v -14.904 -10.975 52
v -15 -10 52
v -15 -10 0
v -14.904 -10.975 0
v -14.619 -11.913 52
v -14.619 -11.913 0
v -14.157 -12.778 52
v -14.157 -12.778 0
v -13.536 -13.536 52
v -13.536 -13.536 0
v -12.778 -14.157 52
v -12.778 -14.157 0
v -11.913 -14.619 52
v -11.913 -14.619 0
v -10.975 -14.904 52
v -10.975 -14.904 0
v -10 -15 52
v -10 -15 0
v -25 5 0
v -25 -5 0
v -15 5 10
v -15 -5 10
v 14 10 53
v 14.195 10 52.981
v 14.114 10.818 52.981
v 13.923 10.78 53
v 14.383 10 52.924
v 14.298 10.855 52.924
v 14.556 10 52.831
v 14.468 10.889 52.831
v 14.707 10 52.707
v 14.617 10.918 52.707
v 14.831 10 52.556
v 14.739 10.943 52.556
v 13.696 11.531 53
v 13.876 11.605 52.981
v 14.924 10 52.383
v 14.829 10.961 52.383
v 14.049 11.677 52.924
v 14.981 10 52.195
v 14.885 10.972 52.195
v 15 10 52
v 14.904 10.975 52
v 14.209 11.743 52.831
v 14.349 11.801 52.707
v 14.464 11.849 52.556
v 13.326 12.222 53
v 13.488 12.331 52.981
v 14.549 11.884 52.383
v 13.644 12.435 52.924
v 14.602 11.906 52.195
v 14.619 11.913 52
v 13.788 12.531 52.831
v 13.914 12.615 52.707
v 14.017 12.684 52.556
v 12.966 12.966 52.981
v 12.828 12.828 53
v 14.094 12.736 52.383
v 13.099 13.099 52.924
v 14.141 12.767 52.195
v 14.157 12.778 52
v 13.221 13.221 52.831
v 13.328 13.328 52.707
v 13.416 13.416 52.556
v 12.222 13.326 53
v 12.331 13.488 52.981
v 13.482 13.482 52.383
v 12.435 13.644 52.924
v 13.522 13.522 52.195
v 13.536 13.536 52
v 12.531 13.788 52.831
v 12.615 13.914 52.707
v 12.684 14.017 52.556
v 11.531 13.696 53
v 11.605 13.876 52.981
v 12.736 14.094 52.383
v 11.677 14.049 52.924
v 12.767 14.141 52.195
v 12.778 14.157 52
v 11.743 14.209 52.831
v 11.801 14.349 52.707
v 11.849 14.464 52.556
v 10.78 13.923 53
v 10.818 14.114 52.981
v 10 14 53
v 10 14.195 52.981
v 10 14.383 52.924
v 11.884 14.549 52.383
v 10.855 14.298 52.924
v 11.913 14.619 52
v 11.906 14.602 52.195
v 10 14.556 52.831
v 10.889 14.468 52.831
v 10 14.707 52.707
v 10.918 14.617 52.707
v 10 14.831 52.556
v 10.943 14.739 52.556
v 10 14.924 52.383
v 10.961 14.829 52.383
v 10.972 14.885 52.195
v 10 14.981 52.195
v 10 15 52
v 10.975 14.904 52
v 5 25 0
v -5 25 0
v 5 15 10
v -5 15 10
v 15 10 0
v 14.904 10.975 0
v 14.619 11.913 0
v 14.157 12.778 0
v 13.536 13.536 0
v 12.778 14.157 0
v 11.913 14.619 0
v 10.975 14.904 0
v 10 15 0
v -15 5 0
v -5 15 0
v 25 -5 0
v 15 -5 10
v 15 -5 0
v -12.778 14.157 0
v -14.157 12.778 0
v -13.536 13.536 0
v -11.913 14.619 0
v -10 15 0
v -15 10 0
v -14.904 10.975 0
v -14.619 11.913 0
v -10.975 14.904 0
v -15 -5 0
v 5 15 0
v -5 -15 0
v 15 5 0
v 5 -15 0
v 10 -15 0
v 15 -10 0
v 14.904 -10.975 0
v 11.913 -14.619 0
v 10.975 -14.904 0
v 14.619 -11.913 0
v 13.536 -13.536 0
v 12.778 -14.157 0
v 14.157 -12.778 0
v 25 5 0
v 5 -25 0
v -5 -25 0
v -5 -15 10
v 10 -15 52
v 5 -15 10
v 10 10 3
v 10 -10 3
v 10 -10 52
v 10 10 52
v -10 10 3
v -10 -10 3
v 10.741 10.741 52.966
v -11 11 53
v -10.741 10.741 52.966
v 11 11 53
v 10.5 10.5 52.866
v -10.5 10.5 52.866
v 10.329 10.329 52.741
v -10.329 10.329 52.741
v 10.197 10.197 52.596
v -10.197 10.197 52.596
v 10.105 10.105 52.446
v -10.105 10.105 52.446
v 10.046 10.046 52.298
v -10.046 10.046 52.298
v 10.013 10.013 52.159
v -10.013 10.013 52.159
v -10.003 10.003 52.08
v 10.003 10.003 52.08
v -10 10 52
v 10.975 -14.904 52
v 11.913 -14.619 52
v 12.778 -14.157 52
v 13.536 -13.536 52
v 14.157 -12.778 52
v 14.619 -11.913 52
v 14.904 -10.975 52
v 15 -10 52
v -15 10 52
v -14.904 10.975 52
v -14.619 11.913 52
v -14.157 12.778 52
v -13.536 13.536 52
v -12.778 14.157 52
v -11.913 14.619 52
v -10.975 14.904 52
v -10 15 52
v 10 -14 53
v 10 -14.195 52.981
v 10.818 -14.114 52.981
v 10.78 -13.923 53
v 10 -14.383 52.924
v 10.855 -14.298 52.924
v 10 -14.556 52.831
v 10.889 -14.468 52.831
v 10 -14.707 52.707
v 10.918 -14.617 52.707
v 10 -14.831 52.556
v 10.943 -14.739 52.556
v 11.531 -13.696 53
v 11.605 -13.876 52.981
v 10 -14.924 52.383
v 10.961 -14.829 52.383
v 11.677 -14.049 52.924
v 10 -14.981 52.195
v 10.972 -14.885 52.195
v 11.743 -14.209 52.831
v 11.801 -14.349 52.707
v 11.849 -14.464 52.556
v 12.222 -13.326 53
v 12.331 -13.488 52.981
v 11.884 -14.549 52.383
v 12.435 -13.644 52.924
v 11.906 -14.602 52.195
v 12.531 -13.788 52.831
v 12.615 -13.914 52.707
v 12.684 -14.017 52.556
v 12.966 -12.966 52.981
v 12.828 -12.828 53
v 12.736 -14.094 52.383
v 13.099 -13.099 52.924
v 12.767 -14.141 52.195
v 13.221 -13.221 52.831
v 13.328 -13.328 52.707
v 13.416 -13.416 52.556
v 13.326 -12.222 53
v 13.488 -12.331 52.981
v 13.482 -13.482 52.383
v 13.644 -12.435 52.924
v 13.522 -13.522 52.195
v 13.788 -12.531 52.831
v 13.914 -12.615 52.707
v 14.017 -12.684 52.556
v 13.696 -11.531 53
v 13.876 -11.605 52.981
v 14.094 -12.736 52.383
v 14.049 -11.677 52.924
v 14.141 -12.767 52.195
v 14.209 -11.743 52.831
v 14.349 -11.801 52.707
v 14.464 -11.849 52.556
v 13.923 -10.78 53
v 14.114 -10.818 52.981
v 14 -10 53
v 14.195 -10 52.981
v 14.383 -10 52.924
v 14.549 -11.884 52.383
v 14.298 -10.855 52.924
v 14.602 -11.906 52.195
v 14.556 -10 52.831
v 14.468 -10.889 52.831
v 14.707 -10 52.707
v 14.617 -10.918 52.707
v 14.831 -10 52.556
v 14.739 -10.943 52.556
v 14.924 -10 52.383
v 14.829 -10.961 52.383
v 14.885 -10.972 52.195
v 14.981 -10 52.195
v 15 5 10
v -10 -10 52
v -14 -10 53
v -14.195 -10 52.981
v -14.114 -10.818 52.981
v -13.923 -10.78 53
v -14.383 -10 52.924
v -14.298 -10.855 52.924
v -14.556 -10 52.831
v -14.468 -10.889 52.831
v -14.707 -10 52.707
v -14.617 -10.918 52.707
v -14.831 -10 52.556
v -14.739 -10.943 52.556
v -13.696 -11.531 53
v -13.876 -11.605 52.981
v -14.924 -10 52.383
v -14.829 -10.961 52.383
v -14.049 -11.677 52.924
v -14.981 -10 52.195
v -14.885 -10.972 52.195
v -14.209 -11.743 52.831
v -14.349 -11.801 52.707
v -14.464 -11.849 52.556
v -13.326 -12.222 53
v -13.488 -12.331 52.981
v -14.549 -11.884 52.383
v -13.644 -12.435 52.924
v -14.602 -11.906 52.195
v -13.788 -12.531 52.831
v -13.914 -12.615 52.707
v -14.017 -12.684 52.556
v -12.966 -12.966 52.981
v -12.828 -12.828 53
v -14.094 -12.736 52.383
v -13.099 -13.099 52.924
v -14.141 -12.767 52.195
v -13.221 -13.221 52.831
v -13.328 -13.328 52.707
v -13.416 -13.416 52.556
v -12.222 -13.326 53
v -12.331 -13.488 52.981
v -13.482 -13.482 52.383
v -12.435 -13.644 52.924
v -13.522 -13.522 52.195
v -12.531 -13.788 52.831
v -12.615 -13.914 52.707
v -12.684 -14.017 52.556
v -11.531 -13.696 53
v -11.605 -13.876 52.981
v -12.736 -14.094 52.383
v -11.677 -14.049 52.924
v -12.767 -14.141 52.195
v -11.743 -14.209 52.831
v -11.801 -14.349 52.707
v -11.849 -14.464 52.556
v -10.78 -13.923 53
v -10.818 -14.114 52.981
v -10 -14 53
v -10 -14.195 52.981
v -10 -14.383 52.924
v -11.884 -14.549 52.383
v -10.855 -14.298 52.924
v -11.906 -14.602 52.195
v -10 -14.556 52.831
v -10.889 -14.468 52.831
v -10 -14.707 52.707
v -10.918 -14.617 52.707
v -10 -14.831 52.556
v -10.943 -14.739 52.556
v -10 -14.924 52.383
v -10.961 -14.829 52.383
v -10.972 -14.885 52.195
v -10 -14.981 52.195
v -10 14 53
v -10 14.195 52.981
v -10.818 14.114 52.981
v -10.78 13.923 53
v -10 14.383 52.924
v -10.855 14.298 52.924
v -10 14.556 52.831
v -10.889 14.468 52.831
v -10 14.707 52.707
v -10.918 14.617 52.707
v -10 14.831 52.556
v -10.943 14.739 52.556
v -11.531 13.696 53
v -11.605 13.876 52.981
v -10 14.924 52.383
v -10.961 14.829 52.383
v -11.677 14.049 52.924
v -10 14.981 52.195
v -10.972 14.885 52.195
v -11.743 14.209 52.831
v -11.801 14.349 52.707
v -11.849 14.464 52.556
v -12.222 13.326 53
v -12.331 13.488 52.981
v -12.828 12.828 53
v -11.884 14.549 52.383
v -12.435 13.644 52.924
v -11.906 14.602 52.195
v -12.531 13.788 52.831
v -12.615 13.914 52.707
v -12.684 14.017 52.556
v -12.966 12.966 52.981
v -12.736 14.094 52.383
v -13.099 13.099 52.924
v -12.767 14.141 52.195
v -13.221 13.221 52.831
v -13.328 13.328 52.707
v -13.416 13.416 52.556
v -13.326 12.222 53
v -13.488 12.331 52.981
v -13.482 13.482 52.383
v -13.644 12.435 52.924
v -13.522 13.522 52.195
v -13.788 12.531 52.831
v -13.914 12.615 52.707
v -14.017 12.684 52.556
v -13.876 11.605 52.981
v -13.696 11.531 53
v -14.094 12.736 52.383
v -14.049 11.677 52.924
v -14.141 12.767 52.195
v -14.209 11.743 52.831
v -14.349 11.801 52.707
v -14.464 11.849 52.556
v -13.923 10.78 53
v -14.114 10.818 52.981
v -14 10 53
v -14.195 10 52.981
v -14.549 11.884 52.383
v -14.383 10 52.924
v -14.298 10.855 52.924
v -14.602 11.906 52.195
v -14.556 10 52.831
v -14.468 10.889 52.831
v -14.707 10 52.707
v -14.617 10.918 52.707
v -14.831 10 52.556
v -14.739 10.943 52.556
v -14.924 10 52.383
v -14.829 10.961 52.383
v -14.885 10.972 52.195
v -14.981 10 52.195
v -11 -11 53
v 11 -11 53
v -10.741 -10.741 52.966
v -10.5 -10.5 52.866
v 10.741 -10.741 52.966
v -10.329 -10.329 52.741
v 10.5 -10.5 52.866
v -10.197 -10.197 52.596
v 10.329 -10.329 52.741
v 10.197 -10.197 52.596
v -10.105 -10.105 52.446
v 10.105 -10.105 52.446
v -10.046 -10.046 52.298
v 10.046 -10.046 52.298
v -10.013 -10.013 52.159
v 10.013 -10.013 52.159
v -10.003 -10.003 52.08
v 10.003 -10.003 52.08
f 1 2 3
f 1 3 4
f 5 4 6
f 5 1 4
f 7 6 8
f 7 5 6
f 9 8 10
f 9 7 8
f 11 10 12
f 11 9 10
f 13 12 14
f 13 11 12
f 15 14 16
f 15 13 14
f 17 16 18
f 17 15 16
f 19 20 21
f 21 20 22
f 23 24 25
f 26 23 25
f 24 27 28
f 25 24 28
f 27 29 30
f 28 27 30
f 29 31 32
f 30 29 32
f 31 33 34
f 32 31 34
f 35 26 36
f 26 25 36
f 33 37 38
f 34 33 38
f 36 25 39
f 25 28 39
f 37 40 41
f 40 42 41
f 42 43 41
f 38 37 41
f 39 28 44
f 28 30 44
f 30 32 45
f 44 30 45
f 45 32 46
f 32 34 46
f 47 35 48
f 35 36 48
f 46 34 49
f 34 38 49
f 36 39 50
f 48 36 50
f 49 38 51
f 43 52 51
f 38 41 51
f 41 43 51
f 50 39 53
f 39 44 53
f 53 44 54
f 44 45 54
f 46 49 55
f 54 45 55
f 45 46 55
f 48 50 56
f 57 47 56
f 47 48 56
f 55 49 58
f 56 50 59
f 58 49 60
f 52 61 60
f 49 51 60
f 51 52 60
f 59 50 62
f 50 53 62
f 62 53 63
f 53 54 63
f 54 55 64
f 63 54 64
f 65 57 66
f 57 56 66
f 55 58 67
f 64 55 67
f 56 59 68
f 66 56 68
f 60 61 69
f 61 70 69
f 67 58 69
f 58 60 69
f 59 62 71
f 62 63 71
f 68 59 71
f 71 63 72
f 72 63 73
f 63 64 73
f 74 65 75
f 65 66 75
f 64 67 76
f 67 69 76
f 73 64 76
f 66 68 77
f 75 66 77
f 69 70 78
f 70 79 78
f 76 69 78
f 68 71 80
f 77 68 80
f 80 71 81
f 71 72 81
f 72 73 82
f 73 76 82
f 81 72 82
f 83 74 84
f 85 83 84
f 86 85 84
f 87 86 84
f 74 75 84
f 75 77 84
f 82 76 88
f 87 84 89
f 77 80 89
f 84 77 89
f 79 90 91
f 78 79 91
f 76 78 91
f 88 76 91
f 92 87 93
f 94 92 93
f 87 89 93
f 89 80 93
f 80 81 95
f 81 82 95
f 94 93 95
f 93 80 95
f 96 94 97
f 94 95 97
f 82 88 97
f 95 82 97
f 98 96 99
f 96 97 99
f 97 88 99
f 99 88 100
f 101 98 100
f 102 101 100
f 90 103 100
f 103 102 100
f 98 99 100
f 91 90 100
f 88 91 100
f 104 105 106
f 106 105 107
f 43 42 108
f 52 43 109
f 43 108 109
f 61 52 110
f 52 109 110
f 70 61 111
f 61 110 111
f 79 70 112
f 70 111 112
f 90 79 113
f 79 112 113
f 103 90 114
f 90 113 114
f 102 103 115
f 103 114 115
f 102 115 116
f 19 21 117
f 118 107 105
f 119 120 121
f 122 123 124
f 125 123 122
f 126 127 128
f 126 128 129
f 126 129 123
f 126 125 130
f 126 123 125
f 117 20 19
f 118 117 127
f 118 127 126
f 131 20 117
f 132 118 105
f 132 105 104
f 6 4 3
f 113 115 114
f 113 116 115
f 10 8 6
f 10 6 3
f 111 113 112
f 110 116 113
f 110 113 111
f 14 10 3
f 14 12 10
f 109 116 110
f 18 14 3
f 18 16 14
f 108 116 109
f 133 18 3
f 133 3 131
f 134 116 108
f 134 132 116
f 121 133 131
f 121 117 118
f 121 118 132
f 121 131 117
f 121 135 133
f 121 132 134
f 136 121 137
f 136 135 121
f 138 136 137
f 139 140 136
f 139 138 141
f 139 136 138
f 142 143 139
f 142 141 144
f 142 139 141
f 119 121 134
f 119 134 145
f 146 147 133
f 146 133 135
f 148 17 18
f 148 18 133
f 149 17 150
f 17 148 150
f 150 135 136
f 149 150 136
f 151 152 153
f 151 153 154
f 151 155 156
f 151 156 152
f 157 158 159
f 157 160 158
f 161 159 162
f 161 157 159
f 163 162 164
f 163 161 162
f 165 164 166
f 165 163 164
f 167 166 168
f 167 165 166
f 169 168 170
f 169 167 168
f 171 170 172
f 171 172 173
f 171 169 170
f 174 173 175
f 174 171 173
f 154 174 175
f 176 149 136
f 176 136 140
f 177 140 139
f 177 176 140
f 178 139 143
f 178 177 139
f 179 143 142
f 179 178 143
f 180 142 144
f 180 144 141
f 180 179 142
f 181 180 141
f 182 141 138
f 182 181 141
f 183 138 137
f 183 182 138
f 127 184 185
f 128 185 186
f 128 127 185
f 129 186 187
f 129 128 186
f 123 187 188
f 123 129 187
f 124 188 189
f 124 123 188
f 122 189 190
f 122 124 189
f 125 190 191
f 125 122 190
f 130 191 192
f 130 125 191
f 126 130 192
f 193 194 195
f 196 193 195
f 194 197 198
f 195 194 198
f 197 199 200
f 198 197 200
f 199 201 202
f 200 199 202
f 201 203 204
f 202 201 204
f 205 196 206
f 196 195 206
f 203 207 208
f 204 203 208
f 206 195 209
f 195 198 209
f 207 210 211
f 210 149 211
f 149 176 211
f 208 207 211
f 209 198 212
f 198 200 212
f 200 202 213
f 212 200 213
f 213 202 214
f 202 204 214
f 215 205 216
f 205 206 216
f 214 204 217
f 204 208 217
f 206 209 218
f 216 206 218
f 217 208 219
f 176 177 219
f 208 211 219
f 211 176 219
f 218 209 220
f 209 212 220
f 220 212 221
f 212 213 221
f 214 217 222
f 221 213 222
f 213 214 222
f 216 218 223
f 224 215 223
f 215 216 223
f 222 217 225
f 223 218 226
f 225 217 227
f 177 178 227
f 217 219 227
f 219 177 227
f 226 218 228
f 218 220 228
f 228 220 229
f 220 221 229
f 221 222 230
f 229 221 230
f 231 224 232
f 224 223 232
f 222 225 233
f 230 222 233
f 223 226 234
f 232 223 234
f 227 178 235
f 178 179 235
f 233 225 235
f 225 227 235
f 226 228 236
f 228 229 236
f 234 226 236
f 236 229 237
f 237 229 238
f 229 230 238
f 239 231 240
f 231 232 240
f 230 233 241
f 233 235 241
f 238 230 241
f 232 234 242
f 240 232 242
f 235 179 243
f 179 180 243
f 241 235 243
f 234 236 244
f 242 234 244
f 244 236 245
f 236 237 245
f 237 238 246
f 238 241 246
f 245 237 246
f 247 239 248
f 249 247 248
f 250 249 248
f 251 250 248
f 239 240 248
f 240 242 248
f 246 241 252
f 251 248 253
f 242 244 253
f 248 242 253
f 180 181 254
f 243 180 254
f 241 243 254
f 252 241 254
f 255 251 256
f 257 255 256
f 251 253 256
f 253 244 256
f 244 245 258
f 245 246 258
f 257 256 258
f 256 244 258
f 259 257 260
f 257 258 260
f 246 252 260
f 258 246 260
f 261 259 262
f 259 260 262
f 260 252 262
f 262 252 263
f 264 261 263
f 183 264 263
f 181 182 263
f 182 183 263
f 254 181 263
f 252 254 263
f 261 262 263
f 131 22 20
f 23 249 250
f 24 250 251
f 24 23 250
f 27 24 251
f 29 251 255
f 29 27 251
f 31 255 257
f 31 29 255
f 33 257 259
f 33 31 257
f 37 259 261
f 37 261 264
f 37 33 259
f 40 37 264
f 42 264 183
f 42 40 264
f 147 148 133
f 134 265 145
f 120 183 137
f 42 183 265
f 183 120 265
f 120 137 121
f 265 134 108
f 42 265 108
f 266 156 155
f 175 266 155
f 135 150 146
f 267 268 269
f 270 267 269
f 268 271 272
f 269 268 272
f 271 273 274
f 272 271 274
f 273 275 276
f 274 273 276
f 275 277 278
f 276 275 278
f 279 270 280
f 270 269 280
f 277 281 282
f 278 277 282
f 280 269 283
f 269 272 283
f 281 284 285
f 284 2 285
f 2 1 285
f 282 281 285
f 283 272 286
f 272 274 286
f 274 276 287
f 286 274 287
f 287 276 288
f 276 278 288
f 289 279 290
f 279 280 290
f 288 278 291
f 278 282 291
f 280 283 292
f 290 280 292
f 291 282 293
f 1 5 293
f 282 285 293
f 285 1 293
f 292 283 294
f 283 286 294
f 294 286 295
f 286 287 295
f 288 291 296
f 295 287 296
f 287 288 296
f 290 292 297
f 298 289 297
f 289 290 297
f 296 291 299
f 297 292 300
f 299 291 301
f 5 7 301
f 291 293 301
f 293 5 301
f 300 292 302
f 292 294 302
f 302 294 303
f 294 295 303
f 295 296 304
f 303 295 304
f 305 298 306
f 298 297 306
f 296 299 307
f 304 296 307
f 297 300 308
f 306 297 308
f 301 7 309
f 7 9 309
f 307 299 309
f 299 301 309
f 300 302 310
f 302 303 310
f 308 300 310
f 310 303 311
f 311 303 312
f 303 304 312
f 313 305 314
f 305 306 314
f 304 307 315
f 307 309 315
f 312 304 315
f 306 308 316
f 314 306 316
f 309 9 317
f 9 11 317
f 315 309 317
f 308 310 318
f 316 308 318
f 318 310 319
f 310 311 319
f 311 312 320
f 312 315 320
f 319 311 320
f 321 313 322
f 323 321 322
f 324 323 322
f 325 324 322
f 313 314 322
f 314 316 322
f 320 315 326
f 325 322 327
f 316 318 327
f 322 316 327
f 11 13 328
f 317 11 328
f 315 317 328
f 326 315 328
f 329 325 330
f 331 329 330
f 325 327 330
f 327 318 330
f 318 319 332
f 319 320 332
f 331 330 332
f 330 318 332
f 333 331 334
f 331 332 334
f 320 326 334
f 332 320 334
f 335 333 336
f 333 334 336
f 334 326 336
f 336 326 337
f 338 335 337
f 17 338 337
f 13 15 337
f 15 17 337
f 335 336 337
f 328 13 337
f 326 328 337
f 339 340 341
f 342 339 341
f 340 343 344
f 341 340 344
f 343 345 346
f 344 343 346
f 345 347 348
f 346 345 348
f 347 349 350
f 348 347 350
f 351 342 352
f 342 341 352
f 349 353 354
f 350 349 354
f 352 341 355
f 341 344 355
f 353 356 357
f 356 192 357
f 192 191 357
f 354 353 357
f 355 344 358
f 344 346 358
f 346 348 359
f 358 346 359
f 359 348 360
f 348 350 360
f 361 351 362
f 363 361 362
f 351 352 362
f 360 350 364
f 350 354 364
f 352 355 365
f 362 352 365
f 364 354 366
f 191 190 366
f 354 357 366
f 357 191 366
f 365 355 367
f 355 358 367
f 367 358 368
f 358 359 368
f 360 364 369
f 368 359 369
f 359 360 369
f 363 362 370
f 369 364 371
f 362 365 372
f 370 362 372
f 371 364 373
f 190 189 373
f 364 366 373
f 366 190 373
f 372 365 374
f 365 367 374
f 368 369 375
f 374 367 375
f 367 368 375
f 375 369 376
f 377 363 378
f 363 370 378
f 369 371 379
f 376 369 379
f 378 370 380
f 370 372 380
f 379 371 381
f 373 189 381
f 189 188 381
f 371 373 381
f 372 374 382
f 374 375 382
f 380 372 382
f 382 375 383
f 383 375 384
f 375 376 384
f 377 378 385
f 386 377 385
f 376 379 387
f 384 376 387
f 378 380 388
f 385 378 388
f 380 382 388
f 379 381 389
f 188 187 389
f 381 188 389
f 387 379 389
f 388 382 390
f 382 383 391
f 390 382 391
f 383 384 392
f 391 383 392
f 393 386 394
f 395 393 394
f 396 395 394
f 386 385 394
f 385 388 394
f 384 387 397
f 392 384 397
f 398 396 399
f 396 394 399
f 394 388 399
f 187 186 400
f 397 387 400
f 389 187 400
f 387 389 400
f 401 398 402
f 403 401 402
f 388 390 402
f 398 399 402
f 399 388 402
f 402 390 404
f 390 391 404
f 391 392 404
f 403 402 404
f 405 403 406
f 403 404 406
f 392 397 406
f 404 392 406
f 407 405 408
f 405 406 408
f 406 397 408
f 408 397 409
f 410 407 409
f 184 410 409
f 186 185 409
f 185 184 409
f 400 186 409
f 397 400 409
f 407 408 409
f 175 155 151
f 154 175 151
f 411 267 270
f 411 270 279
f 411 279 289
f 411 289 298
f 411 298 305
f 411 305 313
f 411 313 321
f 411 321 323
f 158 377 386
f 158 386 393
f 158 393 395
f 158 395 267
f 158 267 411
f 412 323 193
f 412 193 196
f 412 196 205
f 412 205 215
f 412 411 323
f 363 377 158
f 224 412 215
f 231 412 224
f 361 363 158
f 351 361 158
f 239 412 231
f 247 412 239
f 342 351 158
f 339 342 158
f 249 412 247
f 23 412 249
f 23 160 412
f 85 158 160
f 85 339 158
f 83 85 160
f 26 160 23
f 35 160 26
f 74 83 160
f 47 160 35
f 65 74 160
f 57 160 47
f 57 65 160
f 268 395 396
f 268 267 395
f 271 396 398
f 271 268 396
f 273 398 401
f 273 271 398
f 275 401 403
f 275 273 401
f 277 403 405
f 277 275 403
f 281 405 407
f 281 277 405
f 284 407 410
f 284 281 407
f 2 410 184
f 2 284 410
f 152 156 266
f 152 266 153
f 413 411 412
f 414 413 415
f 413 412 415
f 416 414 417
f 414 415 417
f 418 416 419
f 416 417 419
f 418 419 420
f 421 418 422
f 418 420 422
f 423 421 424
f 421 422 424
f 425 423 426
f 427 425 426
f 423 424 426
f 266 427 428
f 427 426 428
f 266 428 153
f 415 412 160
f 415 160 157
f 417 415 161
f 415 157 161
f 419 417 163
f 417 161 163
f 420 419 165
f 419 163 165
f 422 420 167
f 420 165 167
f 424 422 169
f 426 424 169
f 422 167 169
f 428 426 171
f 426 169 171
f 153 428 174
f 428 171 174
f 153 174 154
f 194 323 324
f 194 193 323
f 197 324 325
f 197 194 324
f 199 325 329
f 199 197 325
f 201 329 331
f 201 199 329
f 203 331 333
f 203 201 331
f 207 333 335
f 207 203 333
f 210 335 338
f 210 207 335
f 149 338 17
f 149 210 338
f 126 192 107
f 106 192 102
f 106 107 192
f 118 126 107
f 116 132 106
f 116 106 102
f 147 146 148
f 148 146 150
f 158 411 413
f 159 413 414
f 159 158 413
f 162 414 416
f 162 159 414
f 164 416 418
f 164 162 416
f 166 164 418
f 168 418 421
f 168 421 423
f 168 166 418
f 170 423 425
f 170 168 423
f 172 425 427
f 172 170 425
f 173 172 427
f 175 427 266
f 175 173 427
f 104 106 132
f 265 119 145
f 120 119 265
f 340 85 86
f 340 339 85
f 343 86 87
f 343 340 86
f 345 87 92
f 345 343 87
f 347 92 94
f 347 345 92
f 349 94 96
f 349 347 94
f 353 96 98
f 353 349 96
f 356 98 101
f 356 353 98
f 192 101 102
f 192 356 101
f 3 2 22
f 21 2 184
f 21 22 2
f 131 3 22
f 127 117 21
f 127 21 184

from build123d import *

# Parameters (mm, degrees)
F0_W            = 30
F0_H            = 30
F1_DEPTH        = 3
F2_W            = 30
F2_H            = 30
F2_W_2          = 20
F2_H_2          = 20
F3_DEPTH        = 50
F4_R            = 5
F5_R            = 1
F7_DEPTH        = 5
F7_DEPTH_BACK   = 5
F7_COPIES_COUNT = 4


# Not quite as in the source:
# - a pattern or mirror of a feature is missing from the dataset's text; its kind, count and spacing are read off the source's solid


with BuildPart() as f1:
    # F0 (on Top) → F1 (new body)
    with BuildSketch(Plane.XY):
        Rectangle(F0_W, F0_H)
    extrude(amount=F1_DEPTH)

    # F2 (on face) → F3 (join)
    with BuildSketch(Plane.XY.offset(3)):
        Rectangle(F2_W, F2_H)
        Rectangle(F2_W_2, F2_H_2, mode=Mode.SUBTRACT)
    extrude(amount=F3_DEPTH)

    # F4
    f4_edges = [f1.edges().sort_by_distance(p)[0] for p in [
        (-15, -15, 26.5),
        (-15, 15, 26.5),
        (15, 15, 26.5),
        (15, -15, 26.5),
    ]]
    fillet(f4_edges, radius=F4_R)

    # F5
    f5_edges = [f1.edges().sort_by_distance(p)[0] for p in [
        (15, 0, 53),
        (13.535534, -13.535534, 53),
        (13.535534, 13.535534, 53),
        (0, -15, 53),
        (0, 15, 53),
        (-13.535534, -13.535534, 53),
        (-13.535534, 13.535534, 53),
        (-15, 0, 53),
        (0, 10, 53),
        (10, 0, 53),
        (0, -10, 53),
        (-10, 0, 53),
    ]]
    fillet(f5_edges, radius=F5_R)

    # F6 (on Front) → F7 (join, two sides)
    with BuildSketch(Plane.XZ) as f7_sk:
        Polygon((15, 10), (15, 0), (25, 0), align=None)
    f7 = extrude(amount=F7_DEPTH) + extrude(f7_sk.sketch, amount=-F7_DEPTH_BACK)

    # F7_copies: F7 ×4 about axis
    f7_copies_axis = Axis((0, 0, 0), (0, 0, 1))
    for i in range(1, F7_COPIES_COUNT):
        add(f7.rotate(f7_copies_axis, i * 360 / F7_COPIES_COUNT))


solid = f1.part
